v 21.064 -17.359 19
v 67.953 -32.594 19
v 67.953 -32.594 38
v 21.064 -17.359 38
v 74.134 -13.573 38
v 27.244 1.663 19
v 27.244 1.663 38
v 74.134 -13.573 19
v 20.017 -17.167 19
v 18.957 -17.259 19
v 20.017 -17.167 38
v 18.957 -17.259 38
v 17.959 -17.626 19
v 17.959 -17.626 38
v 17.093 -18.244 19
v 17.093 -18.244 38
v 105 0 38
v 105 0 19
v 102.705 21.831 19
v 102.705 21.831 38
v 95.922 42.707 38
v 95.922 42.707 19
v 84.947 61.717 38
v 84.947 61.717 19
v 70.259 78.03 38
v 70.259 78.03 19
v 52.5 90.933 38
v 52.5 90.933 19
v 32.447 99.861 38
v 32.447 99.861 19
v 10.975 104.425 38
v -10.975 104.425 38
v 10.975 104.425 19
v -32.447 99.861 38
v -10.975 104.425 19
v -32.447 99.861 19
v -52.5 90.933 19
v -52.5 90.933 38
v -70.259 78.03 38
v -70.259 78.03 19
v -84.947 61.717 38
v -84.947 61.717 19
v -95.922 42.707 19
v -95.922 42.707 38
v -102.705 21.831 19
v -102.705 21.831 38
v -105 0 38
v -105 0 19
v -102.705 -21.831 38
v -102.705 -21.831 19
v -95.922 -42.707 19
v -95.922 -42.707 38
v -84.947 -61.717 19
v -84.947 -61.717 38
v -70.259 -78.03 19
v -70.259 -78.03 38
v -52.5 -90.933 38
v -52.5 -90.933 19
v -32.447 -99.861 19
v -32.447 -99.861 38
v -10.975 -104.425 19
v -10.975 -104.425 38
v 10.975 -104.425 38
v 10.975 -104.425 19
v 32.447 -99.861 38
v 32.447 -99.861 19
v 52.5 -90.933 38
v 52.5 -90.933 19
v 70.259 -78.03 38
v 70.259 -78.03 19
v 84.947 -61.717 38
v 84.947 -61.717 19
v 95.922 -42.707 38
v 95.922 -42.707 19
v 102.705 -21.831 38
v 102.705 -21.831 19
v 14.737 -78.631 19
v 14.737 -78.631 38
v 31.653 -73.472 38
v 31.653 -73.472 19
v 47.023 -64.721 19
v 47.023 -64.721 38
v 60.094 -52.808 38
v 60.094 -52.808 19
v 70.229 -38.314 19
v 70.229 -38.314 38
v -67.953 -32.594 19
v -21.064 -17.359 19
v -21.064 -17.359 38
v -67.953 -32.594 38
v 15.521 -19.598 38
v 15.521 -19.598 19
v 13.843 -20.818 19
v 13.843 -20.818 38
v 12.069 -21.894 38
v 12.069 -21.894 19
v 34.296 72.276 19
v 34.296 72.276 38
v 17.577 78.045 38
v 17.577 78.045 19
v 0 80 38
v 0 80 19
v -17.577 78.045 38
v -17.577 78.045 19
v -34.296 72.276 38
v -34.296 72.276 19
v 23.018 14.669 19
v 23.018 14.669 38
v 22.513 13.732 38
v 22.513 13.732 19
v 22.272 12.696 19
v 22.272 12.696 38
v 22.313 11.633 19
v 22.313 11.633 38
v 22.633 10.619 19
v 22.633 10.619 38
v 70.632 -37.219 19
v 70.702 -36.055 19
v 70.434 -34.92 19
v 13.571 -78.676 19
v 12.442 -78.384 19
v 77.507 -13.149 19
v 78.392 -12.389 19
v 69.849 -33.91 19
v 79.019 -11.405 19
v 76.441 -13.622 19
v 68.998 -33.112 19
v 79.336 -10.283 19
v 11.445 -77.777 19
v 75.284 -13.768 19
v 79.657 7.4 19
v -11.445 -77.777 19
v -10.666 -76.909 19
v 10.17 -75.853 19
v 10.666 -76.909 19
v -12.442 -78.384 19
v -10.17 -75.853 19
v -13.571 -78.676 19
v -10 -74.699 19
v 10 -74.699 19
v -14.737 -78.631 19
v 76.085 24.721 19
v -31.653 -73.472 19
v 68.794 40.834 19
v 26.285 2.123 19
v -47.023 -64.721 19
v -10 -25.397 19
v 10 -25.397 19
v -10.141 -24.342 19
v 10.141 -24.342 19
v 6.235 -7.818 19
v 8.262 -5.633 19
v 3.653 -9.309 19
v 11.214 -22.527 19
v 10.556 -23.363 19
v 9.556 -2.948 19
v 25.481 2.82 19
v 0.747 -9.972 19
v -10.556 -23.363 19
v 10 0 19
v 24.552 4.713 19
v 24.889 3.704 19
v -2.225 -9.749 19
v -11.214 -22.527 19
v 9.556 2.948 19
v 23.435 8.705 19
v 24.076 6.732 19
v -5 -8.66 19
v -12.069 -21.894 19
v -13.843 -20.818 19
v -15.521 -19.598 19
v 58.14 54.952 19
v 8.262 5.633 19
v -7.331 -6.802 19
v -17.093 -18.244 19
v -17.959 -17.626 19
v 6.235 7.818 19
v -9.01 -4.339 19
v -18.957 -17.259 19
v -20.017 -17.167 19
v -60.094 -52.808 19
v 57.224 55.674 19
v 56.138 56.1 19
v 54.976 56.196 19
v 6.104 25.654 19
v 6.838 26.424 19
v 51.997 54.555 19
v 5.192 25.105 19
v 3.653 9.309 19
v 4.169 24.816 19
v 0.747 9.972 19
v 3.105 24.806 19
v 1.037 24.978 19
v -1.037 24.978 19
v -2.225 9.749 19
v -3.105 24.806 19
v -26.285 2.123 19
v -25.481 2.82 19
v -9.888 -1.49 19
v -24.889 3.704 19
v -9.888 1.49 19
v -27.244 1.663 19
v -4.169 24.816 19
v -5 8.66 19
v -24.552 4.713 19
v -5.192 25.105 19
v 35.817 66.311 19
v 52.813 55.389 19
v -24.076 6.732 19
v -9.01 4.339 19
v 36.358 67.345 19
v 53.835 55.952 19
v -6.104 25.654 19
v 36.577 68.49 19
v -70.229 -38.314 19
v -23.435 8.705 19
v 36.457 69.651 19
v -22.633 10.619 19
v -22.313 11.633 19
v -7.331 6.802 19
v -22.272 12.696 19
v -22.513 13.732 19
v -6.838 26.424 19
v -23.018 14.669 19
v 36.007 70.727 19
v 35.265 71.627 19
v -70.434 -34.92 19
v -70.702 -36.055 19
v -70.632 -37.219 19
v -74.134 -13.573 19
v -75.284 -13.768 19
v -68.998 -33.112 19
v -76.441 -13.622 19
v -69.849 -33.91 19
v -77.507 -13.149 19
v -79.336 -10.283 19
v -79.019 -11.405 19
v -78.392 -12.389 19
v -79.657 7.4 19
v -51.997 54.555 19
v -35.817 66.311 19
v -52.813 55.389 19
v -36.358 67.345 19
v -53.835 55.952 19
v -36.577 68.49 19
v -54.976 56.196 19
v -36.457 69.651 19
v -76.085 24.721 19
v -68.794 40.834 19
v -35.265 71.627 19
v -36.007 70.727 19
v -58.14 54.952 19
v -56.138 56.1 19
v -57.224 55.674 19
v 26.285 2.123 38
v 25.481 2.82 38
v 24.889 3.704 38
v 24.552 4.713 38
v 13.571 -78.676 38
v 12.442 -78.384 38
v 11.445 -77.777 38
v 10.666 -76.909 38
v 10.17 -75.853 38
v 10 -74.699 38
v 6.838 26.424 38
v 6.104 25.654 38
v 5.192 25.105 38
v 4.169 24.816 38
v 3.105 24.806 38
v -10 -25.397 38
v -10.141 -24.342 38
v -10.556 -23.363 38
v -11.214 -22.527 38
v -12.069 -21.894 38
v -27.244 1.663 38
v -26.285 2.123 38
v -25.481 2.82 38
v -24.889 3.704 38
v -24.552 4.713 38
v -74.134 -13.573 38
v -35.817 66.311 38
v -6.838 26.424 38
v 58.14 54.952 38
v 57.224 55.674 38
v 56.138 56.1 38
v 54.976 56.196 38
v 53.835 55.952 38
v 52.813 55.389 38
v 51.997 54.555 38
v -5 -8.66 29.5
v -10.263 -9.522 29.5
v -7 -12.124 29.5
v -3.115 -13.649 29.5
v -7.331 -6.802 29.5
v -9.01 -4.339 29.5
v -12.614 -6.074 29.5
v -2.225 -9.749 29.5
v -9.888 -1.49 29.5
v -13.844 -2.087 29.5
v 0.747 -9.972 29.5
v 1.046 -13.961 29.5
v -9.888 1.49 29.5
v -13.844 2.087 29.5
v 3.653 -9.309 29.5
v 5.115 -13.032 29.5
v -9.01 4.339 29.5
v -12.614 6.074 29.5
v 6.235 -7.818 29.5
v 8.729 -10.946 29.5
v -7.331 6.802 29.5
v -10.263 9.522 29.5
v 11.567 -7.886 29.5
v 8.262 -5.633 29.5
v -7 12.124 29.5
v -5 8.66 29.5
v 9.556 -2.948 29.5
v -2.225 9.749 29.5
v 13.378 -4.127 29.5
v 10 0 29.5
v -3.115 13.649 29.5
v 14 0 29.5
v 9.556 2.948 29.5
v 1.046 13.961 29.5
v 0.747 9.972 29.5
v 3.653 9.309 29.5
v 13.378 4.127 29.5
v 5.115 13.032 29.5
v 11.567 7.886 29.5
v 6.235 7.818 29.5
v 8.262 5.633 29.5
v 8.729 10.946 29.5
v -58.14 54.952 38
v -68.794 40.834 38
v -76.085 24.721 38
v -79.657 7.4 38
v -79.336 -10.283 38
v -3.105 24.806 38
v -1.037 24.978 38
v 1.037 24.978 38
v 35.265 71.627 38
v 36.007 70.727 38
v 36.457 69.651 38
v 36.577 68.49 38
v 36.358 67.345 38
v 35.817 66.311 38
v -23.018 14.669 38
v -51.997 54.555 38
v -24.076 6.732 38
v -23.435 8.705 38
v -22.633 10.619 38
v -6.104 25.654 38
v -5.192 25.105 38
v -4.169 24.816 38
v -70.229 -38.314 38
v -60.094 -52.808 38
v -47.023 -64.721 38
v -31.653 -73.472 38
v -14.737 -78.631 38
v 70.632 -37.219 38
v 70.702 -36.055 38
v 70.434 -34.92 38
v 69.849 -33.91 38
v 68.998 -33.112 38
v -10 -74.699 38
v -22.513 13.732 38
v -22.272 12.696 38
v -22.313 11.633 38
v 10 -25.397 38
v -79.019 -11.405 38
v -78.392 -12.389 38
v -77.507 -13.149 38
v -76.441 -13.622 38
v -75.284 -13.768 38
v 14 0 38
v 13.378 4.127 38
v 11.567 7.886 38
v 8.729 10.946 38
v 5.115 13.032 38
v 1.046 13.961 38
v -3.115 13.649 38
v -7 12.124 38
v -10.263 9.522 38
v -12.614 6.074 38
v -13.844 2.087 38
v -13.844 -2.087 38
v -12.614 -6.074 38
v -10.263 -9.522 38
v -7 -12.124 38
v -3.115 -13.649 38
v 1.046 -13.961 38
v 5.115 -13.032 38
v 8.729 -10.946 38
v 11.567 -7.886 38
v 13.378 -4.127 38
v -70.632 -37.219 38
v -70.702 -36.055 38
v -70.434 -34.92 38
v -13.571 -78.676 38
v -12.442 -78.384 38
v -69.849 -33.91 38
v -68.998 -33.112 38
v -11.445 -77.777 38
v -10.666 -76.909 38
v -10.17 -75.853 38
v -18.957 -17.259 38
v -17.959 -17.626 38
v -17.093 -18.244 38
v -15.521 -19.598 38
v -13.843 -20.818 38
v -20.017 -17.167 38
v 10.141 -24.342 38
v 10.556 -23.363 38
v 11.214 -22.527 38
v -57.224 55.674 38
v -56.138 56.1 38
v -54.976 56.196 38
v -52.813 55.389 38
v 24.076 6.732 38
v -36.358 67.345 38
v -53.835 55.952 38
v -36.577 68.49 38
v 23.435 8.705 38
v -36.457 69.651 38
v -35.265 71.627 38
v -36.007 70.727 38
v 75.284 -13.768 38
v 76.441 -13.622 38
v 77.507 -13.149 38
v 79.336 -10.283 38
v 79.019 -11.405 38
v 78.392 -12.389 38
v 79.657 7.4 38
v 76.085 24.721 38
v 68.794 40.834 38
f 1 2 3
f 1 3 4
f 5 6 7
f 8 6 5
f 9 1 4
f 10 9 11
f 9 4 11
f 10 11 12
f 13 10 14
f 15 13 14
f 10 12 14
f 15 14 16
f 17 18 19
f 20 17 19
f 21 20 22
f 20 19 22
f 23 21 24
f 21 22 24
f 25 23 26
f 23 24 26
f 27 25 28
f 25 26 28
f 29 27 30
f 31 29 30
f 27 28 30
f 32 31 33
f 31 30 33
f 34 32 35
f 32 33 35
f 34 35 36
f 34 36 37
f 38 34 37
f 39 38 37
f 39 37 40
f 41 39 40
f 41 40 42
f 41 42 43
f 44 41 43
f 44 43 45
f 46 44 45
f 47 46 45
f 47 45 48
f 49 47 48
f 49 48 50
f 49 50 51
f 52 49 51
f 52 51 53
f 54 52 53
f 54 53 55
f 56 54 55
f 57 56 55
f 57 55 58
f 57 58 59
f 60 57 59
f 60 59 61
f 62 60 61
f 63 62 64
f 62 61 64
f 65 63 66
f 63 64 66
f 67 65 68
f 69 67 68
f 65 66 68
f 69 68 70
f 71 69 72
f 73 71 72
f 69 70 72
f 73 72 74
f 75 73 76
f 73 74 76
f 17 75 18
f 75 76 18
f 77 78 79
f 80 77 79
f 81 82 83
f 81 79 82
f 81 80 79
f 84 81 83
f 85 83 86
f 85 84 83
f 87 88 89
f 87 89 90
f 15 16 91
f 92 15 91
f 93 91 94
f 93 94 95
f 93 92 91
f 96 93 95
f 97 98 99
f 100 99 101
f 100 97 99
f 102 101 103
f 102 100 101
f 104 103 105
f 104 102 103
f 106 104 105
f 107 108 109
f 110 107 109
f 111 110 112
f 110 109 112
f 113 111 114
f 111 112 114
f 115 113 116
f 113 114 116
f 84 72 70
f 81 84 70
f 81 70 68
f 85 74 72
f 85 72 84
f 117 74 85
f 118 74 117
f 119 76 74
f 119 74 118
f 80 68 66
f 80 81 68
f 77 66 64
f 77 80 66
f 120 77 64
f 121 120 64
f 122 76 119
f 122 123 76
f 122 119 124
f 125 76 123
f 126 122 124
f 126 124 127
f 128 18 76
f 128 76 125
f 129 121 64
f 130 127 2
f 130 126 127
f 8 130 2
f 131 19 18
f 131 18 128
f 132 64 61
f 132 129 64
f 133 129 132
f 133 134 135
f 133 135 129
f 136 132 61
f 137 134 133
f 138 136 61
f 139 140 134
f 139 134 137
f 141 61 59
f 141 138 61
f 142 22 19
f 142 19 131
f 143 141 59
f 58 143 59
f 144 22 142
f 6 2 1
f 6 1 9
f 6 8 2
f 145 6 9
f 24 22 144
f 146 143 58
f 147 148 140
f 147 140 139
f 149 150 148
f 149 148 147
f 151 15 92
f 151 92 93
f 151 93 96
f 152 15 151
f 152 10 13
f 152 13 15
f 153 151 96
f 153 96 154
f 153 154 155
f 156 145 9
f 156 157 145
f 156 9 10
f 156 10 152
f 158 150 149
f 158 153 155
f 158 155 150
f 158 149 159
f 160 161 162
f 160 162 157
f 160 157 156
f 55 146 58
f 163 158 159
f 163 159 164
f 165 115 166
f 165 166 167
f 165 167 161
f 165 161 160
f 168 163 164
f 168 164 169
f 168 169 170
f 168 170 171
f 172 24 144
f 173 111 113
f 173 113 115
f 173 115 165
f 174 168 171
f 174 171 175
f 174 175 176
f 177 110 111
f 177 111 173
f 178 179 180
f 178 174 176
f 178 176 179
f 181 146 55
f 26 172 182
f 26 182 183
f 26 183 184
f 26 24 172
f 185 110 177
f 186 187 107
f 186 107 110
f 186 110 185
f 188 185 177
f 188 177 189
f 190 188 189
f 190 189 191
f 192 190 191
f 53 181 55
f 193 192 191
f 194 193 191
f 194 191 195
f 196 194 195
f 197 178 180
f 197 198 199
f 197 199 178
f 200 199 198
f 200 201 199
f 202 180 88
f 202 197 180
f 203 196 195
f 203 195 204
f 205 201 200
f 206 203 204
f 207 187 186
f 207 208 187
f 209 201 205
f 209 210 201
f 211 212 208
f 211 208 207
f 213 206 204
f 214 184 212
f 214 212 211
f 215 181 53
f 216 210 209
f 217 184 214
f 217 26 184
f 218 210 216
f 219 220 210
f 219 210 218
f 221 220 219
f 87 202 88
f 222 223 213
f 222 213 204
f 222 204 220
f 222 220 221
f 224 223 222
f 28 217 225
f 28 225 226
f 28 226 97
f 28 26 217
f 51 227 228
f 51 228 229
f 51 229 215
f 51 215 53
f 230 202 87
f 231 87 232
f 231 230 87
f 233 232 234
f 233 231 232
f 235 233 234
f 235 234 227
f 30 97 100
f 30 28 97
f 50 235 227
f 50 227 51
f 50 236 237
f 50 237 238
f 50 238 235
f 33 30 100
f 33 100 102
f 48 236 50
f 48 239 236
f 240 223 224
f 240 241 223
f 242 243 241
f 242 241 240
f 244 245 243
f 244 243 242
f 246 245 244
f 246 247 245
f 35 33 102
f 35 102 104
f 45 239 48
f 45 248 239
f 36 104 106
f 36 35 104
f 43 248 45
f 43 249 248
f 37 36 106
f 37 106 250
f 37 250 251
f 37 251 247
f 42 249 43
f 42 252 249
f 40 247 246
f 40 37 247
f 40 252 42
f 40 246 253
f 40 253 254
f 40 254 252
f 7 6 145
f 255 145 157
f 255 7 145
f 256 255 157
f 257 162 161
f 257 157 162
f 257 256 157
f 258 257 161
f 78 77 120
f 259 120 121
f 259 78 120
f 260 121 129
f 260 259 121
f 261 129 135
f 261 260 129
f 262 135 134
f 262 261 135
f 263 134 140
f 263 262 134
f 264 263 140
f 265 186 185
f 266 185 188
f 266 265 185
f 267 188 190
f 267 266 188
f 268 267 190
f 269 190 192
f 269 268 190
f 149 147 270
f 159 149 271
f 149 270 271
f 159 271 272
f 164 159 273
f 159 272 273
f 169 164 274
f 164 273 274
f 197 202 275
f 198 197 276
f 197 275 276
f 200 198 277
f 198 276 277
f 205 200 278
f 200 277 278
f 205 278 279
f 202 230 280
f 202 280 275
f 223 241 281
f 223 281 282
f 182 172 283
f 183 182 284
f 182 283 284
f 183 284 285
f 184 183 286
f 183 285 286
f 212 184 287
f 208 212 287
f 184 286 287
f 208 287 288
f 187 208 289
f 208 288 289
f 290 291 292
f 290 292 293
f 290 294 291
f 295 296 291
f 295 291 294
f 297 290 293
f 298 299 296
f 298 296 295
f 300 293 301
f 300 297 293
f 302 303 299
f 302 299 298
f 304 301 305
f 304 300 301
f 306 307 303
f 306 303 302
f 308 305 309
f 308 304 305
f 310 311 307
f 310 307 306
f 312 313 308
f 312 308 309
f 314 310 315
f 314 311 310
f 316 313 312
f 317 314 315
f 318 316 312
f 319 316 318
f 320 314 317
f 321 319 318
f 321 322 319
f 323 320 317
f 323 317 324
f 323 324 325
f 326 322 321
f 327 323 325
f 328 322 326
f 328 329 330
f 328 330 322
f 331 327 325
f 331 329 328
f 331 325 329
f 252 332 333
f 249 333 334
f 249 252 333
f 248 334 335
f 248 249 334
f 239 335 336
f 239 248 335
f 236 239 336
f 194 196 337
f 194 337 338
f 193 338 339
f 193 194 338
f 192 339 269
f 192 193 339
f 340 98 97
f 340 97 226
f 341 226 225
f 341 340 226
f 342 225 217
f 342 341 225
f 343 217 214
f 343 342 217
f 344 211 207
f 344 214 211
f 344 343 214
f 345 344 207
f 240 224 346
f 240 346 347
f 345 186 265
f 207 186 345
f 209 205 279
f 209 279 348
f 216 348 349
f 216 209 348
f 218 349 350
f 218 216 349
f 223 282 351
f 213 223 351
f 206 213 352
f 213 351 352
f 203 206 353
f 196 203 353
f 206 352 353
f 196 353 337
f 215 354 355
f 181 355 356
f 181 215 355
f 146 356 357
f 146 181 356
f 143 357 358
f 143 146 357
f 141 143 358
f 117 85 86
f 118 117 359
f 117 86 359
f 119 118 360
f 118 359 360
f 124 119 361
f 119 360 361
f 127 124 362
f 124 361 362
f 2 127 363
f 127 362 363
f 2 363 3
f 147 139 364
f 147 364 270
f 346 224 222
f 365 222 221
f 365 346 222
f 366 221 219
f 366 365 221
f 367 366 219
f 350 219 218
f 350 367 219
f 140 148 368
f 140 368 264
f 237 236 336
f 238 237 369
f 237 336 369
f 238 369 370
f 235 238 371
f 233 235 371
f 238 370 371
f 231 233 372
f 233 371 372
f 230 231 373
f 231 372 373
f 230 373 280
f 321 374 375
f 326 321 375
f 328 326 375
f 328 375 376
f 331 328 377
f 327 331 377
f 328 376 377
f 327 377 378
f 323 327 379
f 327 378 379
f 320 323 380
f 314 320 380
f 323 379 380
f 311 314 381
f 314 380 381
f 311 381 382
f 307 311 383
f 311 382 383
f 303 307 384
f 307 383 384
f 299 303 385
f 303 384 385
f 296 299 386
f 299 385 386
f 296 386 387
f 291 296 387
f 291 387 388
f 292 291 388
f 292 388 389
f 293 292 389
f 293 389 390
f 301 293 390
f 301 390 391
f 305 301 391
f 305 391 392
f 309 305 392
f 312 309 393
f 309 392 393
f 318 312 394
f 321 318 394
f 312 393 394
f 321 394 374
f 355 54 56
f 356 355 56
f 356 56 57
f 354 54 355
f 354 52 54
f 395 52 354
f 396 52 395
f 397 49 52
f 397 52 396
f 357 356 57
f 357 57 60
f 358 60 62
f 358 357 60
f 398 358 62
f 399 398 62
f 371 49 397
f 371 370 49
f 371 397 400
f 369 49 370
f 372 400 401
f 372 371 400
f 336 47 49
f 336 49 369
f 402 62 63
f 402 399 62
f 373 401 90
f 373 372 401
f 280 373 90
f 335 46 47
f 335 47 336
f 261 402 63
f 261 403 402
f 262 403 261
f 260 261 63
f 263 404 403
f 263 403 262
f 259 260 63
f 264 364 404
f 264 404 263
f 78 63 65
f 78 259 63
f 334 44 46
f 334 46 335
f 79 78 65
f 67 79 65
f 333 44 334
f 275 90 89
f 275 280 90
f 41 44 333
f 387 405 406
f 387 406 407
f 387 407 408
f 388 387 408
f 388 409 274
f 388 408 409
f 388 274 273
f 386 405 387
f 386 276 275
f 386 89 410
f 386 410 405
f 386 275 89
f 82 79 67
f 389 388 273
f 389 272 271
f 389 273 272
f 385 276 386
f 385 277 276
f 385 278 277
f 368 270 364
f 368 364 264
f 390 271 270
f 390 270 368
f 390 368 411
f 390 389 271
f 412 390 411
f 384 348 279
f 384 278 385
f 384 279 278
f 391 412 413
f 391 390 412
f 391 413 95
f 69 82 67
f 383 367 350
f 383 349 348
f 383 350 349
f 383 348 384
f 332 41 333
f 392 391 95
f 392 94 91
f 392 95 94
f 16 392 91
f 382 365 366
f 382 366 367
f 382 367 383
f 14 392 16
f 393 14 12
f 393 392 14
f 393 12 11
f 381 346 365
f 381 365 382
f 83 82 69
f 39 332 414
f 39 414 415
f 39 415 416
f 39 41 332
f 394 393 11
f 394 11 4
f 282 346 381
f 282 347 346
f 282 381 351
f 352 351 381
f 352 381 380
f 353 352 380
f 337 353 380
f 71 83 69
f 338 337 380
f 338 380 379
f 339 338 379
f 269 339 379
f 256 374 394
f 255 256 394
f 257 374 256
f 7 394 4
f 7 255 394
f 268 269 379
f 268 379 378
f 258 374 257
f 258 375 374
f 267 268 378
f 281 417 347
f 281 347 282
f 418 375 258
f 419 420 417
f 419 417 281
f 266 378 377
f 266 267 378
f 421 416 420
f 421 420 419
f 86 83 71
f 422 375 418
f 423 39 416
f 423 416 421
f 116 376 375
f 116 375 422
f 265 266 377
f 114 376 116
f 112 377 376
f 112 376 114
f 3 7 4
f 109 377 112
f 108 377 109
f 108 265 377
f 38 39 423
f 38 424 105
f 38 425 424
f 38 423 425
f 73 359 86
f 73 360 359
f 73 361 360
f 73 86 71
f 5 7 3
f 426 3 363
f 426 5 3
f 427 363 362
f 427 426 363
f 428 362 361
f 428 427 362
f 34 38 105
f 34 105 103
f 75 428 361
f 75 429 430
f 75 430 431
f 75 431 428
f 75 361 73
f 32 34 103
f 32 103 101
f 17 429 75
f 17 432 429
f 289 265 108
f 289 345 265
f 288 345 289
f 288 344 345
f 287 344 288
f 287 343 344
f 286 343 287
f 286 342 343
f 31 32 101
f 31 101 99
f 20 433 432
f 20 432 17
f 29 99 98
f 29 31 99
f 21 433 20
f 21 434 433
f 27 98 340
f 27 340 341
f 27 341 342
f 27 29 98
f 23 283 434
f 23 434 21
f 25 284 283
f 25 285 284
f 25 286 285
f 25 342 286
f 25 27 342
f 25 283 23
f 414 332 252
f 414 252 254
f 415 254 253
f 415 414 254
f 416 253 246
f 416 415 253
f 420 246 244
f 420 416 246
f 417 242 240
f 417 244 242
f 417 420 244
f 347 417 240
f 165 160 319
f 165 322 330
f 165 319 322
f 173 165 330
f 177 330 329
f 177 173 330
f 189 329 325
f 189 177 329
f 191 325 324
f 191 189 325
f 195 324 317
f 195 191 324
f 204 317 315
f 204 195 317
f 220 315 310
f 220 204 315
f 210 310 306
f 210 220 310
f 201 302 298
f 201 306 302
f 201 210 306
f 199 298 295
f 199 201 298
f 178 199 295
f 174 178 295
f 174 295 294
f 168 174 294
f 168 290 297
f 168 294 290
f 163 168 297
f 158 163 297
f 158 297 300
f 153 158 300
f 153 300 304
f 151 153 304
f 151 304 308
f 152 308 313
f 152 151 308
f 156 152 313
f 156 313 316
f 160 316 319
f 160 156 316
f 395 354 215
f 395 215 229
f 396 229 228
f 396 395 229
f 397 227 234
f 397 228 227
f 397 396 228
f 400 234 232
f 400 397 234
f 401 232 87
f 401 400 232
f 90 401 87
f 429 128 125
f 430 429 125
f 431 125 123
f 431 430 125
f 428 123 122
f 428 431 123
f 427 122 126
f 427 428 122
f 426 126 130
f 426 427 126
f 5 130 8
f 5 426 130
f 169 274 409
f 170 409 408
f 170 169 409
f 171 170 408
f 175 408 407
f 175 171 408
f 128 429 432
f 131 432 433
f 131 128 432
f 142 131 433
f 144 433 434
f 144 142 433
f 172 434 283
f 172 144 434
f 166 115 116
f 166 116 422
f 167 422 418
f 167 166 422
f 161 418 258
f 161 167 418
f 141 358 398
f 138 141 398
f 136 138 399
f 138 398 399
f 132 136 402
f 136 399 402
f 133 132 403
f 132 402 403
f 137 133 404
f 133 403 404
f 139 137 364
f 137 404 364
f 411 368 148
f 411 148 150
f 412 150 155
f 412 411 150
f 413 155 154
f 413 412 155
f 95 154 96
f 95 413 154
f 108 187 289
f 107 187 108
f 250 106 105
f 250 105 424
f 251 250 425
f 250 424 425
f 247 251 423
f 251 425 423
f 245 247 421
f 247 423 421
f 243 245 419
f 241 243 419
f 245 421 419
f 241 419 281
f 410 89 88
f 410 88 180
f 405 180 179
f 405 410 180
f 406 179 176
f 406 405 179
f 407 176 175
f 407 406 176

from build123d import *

# Parameters (mm, degrees)
ESQUISSE1_R                  = 105
BOSS_EXTRU_1_DEPTH           = 38
ENL_V_MAT_EXTRU_1_DEPTH      = 154.277526076
ENL_V_MAT_EXTRU_1_DEPTH_BACK = 154.277526076
ENL_V_MAT_EXTRU_2_DEPTH      = 154.277526076
ENL_V_MAT_EXTRU_2_DEPTH_BACK = 154.277526076
ESQUISSE3_R                  = 10
ESQUISSE4_R                  = 14
ENL_V_MAT_EXTRU_3_DEPTH      = 8.5
ENL_V_START                  = -29.5
ESQUISSE4_2_R                = 14
ENL_V_MAT_EXTRU_4_DEPTH      = 8.5
CONG_1_R                     = 4
ESQUISSE5_R                  = 105
ENL_V_MAT_EXTRU_5_DEPTH      = 19


with BuildPart() as part:
    # Esquisse1 → Boss.-Extru.1 (new body)
    with BuildSketch(Plane.XY):
        Circle(ESQUISSE1_R)
    extrude(amount=BOSS_EXTRU_1_DEPTH)

    # Esquisse2 → Enlèv. mat.-Extru.1 (cut, two sides: drawn at the far end of the back side and taken through both)
    with BuildSketch(Plane.XY.offset(38).offset(-ENL_V_MAT_EXTRU_1_DEPTH_BACK)):
        with BuildLine():
            Line((5.377682111, 24.414760599), (38.563838113, 70.091585729))
            ThreePointArc((38.563838113, 70.091585729), (0, 80), (-38.563838113, 70.091585729))
            Line((-38.563838113, 70.091585729), (-5.377682111, 24.414760599))
            ThreePointArc((-5.377682111, 24.414760599), (0, 25), (5.377682111, 24.414760599))
        make_face()
        with BuildLine():
            Line((24.881612324, 2.430096324), (78.57794069, -15.016898377))
            ThreePointArc((78.57794069, -15.016898377), (76.084521304, 24.72135955), (54.744178, 58.335880683))
            Line((54.744178, 58.335880683), (21.558021999, 12.659055553))
            ThreePointArc((21.558021999, 12.659055553), (23.776412907, 7.725424859), (24.881612324, 2.430096324))
        make_face()
        with BuildLine():
            Line((10, -22.912878475), (10, -79.372539332))
            ThreePointArc((10, -79.372539332), (47.022820183, -64.72135955), (72.397600803, -34.038028703))
            Line((72.397600803, -34.038028703), (18.701272437, -16.591034002))
            ThreePointArc((18.701272437, -16.591034002), (14.694631307, -20.225424859), (10, -22.912878475))
        make_face()
        with BuildLine():
            Line((-18.701272437, -16.591034002), (-72.397600803, -34.038028703))
            ThreePointArc((-72.397600803, -34.038028703), (-47.022820183, -64.72135955), (-10, -79.372539332))
            Line((-10, -79.372539332), (-10, -22.912878475))
            ThreePointArc((-10, -22.912878475), (-14.694631307, -20.225424859), (-18.701272437, -16.591034002))
        make_face()
        with BuildLine():
            Line((-21.558021999, 12.659055553), (-54.744178, 58.335880683))
            ThreePointArc((-54.744178, 58.335880683), (-76.084521304, 24.72135955), (-78.57794069, -15.016898377))
            Line((-78.57794069, -15.016898377), (-24.881612324, 2.430096324))
            ThreePointArc((-24.881612324, 2.430096324), (-23.776412907, 7.725424859), (-21.558021999, 12.659055553))
        make_face()
    extrude(amount=ENL_V_MAT_EXTRU_1_DEPTH + ENL_V_MAT_EXTRU_1_DEPTH_BACK, mode=Mode.SUBTRACT)

    # Esquisse3 → Enlèv. mat.-Extru.2 (cut, two sides: drawn at the far end of the back side and taken through both)
    with BuildSketch(Plane.XY.offset(38).offset(-ENL_V_MAT_EXTRU_2_DEPTH_BACK)):
        Circle(ESQUISSE3_R)
    extrude(amount=ENL_V_MAT_EXTRU_2_DEPTH + ENL_V_MAT_EXTRU_2_DEPTH_BACK, mode=Mode.SUBTRACT)

    # Esquisse4 → Enlèv. mat.-Extru.3 (cut)
    with BuildSketch(Plane.XY.offset(38)):
        Circle(ESQUISSE4_R)
    extrude(amount=-ENL_V_MAT_EXTRU_3_DEPTH, mode=Mode.SUBTRACT)

    # Esquisse4<2> → Enlèv. mat.-Extru.4 (cut)
    with BuildSketch(Plane.XY.offset(38).offset(ENL_V_START)):
        Circle(ESQUISSE4_2_R)
    extrude(amount=-ENL_V_MAT_EXTRU_4_DEPTH, mode=Mode.SUBTRACT)

    # Congé1
    cong_1_edges = [part.edges().sort_by_distance(p)[0] for p in [
        (-78.57794069, -15.016898377, 19),
        (-54.744178, 58.335880683, 19),
        (-21.558021999, 12.659055553, 19),
        (-24.881612324, 2.430096324, 19),
        (-10, -79.372539332, 19),
        (-72.397600803, -34.038028703, 19),
        (-18.701272437, -16.591034002, 19),
        (-10, -22.912878475, 19),
        (72.397600803, -34.038028703, 19),
        (10, -79.372539332, 19),
        (10, -22.912878475, 19),
        (18.701272437, -16.591034002, 19),
        (54.744178, 58.335880683, 19),
        (78.57794069, -15.016898377, 19),
        (24.881612324, 2.430096324, 19),
        (21.558021999, 12.659055553, 19),
        (-38.563838113, 70.091585729, 19),
        (38.563838113, 70.091585729, 19),
        (5.377682111, 24.414760599, 19),
        (-5.377682111, 24.414760599, 19),
    ]]
    fillet(cong_1_edges, radius=CONG_1_R)

    # Esquisse5 → Enlèv. mat.-Extru.5 (cut)
    with BuildSketch(Plane(origin=(0, 0, 0), x_dir=(-1, 0, 0), z_dir=(0, 0, -1))):
        Circle(ESQUISSE5_R)
    extrude(amount=-ENL_V_MAT_EXTRU_5_DEPTH, mode=Mode.SUBTRACT)


solid = part.part
